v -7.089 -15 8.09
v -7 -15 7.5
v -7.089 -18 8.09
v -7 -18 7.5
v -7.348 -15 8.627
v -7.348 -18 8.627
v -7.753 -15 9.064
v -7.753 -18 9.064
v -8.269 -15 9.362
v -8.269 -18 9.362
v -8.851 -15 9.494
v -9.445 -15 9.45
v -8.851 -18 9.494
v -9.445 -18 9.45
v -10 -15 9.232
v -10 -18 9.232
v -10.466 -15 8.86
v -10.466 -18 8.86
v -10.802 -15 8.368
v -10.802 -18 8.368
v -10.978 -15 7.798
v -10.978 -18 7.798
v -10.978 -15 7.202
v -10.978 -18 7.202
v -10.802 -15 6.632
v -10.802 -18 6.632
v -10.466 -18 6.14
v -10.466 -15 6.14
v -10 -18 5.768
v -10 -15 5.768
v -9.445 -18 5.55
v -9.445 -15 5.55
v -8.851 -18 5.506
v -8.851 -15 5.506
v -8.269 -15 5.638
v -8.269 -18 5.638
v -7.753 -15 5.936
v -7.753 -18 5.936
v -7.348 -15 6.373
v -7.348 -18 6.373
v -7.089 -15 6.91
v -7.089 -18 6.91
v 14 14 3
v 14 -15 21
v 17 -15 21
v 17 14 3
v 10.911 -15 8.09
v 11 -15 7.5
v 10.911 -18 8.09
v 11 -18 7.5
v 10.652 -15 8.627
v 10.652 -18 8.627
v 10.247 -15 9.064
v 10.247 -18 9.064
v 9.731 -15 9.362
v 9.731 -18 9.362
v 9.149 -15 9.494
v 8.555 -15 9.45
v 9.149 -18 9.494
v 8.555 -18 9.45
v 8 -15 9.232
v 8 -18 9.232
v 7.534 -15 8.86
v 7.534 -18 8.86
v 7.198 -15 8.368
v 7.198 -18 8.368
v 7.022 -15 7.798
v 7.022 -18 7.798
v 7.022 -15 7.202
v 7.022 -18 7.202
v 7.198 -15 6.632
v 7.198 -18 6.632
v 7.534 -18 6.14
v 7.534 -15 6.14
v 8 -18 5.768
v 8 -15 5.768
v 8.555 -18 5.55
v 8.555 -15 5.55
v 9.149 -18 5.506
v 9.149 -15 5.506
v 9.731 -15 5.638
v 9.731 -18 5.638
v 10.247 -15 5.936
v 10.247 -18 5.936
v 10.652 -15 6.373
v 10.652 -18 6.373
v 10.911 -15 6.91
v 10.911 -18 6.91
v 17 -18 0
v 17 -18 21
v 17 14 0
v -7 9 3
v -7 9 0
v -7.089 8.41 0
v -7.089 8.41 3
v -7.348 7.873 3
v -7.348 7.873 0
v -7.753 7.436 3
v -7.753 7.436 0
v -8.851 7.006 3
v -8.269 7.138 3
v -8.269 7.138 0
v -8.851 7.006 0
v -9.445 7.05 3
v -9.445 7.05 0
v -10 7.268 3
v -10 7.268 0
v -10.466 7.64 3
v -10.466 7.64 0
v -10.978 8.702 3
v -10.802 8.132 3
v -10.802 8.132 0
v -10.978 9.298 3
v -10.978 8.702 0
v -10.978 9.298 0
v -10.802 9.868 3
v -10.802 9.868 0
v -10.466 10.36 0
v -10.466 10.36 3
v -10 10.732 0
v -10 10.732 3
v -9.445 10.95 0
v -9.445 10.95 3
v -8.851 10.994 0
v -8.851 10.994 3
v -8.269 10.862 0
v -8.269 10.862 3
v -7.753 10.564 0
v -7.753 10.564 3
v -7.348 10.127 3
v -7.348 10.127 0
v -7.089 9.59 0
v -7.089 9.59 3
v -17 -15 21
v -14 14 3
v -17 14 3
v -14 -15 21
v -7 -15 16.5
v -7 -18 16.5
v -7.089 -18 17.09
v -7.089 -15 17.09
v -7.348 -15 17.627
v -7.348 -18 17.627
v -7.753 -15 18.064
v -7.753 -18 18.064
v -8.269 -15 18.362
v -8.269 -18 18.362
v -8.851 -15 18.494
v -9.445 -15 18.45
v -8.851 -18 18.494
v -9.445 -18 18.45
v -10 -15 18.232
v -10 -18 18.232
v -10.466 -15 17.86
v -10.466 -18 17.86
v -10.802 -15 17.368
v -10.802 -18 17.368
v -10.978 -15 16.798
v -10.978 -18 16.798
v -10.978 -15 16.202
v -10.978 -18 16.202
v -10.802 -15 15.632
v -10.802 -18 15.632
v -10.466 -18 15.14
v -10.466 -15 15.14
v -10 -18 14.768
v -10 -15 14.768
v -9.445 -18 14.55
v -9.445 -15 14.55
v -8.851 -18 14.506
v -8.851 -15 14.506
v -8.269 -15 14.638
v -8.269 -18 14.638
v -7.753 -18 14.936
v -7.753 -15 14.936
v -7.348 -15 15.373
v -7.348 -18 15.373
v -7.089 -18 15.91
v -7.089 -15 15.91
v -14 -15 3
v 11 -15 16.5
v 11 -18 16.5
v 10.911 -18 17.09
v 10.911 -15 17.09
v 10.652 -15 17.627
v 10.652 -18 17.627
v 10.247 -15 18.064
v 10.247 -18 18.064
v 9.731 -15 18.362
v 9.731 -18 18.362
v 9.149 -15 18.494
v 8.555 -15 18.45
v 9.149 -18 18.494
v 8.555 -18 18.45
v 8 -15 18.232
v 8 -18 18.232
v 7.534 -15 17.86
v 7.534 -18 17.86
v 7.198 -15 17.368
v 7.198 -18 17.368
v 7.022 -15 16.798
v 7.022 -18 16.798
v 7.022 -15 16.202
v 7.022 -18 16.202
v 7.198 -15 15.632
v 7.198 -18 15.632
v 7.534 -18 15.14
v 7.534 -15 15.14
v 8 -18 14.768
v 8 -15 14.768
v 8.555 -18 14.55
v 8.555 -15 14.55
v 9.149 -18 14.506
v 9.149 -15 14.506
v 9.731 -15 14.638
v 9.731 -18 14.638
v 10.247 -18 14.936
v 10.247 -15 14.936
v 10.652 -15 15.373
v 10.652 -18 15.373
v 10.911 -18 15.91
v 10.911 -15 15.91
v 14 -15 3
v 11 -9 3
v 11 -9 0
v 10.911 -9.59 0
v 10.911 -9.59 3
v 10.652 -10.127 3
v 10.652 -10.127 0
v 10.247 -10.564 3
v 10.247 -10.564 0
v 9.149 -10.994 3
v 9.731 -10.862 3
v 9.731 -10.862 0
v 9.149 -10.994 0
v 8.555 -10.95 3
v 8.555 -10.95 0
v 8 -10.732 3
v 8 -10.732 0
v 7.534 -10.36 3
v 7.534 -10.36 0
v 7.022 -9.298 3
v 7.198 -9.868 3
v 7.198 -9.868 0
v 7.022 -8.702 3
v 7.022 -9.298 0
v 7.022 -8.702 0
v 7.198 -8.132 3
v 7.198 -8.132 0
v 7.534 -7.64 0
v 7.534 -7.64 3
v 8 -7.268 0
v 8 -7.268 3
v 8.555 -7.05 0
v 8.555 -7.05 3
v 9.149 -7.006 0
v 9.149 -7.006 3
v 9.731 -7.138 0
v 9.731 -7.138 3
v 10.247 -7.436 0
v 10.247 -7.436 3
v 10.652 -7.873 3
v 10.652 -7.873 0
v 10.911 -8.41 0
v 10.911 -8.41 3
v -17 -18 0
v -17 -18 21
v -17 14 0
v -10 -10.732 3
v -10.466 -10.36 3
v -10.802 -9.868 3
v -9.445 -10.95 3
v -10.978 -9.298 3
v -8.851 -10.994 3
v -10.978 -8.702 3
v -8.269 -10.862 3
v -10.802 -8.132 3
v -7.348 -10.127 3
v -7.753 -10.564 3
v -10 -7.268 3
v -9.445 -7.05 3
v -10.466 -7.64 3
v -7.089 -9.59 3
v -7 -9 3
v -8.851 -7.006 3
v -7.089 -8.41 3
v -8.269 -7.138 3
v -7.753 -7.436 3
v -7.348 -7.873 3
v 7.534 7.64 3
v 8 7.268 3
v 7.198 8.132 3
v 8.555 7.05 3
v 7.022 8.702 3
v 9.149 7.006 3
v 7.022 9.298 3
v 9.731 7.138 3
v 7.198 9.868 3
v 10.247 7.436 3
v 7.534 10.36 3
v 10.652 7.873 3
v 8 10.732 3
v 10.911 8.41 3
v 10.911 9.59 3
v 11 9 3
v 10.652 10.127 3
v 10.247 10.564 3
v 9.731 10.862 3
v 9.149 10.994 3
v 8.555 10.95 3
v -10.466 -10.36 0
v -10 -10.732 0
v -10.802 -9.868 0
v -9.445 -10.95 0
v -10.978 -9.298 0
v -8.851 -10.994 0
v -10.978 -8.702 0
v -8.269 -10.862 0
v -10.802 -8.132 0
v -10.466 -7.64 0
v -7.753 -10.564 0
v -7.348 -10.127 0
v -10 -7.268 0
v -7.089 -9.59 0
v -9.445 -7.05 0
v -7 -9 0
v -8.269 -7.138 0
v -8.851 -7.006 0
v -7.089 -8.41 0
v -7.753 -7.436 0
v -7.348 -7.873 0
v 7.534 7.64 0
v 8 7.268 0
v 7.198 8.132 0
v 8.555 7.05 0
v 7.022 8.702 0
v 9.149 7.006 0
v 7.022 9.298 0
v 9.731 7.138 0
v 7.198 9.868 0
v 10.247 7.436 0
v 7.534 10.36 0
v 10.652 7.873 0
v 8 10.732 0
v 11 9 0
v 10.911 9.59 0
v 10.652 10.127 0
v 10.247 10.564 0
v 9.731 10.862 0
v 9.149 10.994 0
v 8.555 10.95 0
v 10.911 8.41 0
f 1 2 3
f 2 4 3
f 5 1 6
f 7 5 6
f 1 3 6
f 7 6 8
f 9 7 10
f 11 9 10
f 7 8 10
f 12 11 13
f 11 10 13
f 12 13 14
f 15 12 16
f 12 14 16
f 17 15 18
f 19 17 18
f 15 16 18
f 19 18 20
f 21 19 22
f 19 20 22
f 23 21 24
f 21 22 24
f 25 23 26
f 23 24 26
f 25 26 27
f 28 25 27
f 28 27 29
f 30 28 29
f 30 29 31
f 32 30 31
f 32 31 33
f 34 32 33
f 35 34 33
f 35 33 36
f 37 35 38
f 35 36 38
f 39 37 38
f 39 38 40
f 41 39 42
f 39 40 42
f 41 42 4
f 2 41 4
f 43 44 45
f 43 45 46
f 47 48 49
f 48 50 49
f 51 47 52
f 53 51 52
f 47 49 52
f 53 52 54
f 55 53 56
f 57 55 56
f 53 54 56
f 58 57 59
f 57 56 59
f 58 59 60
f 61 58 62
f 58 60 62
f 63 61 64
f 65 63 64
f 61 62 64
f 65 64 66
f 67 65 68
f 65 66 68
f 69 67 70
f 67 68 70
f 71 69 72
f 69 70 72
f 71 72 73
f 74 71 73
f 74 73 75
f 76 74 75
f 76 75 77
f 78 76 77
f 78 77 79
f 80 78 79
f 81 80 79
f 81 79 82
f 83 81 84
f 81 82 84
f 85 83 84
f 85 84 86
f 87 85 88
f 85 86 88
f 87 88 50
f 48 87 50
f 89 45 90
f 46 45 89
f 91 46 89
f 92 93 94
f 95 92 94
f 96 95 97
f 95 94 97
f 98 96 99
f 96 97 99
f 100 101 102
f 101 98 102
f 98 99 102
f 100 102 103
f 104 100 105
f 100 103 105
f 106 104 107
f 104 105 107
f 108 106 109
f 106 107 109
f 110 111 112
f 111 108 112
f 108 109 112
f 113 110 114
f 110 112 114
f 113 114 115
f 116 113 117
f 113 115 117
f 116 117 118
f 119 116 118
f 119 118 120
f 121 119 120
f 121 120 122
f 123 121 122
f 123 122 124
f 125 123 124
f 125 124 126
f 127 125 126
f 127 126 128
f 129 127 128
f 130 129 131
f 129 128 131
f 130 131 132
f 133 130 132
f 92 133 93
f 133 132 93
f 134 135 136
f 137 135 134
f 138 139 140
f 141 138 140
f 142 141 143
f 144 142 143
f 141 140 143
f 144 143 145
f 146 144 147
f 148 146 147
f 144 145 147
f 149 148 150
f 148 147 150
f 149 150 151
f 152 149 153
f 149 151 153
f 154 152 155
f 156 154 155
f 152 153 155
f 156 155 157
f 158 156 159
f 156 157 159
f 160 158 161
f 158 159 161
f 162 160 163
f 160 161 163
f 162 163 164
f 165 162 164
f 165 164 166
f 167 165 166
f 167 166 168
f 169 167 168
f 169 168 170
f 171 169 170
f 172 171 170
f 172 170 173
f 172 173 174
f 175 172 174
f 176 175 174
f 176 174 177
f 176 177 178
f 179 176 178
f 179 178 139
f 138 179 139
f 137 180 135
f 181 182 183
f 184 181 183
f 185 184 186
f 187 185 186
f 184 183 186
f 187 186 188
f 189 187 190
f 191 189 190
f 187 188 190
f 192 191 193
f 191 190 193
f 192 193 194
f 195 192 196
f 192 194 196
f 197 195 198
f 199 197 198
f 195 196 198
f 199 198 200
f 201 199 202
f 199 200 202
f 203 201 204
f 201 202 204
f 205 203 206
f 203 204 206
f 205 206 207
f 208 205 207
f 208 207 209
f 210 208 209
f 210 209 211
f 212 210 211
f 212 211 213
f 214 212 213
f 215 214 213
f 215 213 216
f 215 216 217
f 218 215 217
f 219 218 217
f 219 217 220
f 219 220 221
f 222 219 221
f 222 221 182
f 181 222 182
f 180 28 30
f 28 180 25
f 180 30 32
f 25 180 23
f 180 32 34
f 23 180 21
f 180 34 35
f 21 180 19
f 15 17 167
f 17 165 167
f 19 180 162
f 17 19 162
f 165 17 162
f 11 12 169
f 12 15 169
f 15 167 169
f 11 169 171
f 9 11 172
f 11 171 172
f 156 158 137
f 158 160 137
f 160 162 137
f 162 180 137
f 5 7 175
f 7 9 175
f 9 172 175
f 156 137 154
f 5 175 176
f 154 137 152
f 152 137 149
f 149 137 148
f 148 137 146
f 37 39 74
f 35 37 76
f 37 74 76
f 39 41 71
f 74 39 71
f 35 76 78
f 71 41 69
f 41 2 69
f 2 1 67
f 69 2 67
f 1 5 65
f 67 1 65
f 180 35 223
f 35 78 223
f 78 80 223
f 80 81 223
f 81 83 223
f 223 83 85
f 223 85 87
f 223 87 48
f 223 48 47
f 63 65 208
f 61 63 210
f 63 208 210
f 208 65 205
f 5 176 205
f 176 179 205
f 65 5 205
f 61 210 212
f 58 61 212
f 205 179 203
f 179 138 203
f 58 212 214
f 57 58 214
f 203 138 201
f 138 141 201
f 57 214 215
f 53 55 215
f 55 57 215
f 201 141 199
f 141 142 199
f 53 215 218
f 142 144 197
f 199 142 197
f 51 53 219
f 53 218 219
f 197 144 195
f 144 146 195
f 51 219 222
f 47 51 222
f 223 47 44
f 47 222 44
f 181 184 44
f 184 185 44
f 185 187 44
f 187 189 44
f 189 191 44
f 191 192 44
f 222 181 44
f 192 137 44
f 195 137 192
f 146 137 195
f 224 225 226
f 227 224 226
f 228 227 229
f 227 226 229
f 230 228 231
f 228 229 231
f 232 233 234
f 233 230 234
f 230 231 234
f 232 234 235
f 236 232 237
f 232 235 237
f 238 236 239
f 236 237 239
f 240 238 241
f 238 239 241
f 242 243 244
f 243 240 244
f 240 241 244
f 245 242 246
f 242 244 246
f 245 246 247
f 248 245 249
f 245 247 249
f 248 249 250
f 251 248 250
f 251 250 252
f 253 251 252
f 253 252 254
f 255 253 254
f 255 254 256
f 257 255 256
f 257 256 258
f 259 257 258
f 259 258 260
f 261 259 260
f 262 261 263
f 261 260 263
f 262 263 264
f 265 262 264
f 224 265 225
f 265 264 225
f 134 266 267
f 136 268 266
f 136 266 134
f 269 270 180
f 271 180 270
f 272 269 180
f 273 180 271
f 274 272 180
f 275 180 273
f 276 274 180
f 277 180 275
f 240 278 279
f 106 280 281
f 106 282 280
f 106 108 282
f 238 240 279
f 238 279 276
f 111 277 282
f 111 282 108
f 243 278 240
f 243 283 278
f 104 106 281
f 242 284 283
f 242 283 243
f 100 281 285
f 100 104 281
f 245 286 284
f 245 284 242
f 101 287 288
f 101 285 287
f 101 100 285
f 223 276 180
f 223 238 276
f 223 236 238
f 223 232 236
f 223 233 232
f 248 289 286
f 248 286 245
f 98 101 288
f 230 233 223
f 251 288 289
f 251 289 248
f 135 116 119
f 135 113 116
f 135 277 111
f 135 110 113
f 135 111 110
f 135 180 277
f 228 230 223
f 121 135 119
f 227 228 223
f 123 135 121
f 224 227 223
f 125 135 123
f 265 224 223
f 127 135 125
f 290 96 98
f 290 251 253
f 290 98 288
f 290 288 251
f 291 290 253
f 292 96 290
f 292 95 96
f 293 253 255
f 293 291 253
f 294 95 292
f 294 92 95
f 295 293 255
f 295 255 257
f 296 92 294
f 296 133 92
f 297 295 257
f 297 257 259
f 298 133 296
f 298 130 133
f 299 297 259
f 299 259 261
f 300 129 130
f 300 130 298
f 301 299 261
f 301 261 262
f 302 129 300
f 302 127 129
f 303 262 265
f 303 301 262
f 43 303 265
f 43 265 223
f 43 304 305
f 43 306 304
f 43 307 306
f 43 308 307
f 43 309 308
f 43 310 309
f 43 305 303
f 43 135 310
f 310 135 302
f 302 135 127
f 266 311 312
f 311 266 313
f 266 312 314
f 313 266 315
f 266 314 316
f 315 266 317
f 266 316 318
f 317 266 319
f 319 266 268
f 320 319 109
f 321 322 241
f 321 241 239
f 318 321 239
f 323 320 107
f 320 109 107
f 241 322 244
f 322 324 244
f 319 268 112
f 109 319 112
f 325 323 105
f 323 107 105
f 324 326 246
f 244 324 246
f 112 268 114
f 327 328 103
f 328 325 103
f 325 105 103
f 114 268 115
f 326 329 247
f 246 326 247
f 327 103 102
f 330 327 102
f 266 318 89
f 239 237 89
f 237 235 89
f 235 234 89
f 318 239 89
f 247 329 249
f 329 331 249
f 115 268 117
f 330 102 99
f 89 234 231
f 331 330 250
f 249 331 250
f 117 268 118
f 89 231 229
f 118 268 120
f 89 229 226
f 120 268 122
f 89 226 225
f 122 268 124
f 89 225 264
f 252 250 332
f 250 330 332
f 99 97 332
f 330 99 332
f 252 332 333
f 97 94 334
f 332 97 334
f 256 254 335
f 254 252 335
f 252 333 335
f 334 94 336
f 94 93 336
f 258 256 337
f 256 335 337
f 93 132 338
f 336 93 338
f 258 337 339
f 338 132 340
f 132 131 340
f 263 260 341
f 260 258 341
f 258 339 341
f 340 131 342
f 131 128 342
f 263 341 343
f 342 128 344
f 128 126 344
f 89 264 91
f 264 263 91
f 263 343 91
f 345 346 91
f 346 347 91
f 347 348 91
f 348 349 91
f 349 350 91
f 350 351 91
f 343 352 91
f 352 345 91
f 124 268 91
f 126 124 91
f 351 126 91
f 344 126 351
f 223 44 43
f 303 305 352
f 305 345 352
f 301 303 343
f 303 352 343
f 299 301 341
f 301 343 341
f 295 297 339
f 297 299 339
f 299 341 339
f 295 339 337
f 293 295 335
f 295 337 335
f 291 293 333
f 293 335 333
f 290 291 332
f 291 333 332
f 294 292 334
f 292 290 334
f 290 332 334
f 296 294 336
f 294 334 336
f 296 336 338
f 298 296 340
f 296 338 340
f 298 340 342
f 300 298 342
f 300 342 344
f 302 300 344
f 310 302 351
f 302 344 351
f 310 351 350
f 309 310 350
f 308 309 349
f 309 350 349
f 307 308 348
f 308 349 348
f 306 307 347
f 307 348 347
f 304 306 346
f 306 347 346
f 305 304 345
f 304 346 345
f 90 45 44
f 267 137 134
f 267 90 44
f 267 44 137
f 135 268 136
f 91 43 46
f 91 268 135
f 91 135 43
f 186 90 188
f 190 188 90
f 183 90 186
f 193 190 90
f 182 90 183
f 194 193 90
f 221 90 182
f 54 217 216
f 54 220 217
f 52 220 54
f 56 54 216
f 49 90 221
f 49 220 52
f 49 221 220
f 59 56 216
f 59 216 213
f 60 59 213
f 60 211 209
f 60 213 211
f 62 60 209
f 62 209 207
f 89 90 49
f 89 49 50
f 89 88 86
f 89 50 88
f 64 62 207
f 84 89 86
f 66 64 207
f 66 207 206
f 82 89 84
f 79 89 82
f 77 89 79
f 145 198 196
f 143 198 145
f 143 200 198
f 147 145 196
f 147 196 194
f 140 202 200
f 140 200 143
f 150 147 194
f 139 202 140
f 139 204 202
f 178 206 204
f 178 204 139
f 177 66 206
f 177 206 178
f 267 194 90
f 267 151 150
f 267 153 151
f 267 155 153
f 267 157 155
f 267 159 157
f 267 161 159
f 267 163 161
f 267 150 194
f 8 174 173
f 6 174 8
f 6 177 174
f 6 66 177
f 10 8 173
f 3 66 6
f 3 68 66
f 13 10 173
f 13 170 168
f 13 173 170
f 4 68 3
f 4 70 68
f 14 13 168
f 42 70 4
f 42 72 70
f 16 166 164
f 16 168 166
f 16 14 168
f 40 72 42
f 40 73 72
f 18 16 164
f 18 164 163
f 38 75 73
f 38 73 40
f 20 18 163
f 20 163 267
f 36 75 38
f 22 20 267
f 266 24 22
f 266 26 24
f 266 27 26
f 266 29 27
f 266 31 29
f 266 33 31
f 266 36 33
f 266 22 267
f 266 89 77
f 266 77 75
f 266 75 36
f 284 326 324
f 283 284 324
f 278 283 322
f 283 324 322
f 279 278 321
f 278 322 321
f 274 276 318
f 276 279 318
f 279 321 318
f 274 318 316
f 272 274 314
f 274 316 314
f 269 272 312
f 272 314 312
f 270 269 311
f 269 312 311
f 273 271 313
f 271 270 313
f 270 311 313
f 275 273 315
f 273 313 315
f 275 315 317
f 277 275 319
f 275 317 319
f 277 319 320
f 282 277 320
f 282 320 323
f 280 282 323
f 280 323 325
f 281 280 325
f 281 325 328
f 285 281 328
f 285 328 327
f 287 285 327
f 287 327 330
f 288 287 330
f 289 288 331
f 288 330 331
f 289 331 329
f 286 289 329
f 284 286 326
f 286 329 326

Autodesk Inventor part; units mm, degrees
ref_plane "YZ Plane" through (0, 0, 0) normal (1, 0, 0) x (0, 1, 0)
ref_plane "XZ Plane" through (0, 0, 0) normal (0, 1, 0) x (-1, 0, 0)
ref_plane "XY Plane" through (0, 0, 0) normal (0, 0, 1) x (1, 0, 0)
sketch "Sketch1" plane through (0, 0, 0) normal (0, 0, 1) x (1, 0, 0)
  line L0 (-9, -9) -> (9, -9) construction
  line L1 (9, -9) -> (9, 9) construction
  line L2 (9, 9) -> (-9, 9) construction
  line L3 (-9, 9) -> (-9, -9) construction
  line L4 (-9, -9) -> (9, 9) construction
  line L5 (9, -9) -> (-9, 9) construction
  circle A0 centre (-9, 9) radius 2
  circle A1 centre (9, 9) radius 2
  circle A2 centre (9, -9) radius 2
  circle A3 centre (-9, -9) radius 2
  line L6 (-13.4025, 9) -> (21.0308, 9) construction
  line L7 (-13.4025, -18) -> (21.0308, -18)
  line L8 (14, -14) -> (-14, -14)
  line L9 (-14, -14) -> (-14, 14)
  line L10 (-14, 14) -> (14, 14)
  line L11 (14, 14) -> (14, -14)
  line L12 (-14, 14) -> (14, 14)
  line L13 (14, 14) -> (14, -18)
  line L14 (14, -18) -> (-14, -18)
  line L15 (-14, -18) -> (-14, 14)
  point P0 (0, 0)
  dimension "d0" = 18
  dimension "d1" = 18
  dimension "d2" = 4
  dimension "d3" = 4
  dimension "d4" = 27
  dimension "d5" = 5
  dimension "d6" = 9
  dimension "d7" = 14
extrude "Extrusion1" add sketch "Sketch1" along normal blind 3
sketch "Sketch2" plane through (-14, -18, 0) normal (0, -1, 0) x (1, 0, 0)
  line L0 (0, 3) -> (28, 3)
  line L1 (28, 3) -> (28, 21)
  line L2 (28, 21) -> (0, 21)
  line L3 (0, 21) -> (0, 3)
  line L4 (0, 21) -> (28, 3) construction
  line L5 (5, 7.5) -> (23, 7.5) construction
  line L6 (23, 7.5) -> (23, 16.5) construction
  line L7 (23, 16.5) -> (5, 16.5) construction
  line L8 (5, 16.5) -> (5, 7.5) construction
  line L9 (5, 7.5) -> (23, 16.5) construction
  line L10 (23, 7.5) -> (5, 16.5) construction
  circle A0 centre (5, 16.5) radius 2
  circle A1 centre (23, 16.5) radius 2
  line L11 (5, 12) -> (23, 12) construction
  line L12 (14, 16.5) -> (14, 7.5) construction
  circle A2 centre (5, 7.5) radius 2
  circle A3 centre (23, 7.5) radius 2
  line L13 (0, 0) -> (28, 0) projected
  line L14 (28, 0) -> (28, 3) projected
  line L15 (0, 3) -> (28, 3) projected
  line L16 (0, 0) -> (0, 3) projected
  line L17 (0, 0) -> (28, 0)
  line L18 (28, 0) -> (28, 3)
  line L19 (28, 3) -> (0, 3)
  line L20 (0, 3) -> (0, 0)
  point P0 (14, 0)
  point P1 (14, 12)
  dimension "d11" = 18
  dimension "d12" = 18
  dimension "d13" = 9
  dimension "d14" = 4
  dimension "d15" = 4
extrude "Extrusion2" add sketch "Sketch2" against normal blind 3
sketch "Sketch4" plane through (-14, 14, 0) normal (-1, 0, 0) x (0, 0, 1)
  line L0 (3, -29) -> (3, 0) projected
  line L1 (21, -32) -> (21, -29) projected
  line L2 (0, 0) -> (0, -32) projected
  line L3 (3, -29) -> (21, -29) projected
  line L4 (21, -32) -> (21, -29) projected
  line L5 (3, 0) -> (3, -29) projected
  line L6 (0, 0) -> (3, 0) projected
  line L7 (0, -32) -> (21, -32) projected
  line L8 (3, 0) -> (21, -29)
  point P0 (0, -14)
  point P1 (3, -32)
  point P2 (3, 0)
  point P3 (21, -32)
  point P4 (3, 0)
extrude "Extrusion3" add sketch "Sketch4" along normal blind 3
mirror "Mirror1" about plane through (0, 0, 0) normal (1, 0, 0) of "Extrusion3"
sketch "Sketch5" plane through (-14, -18, 0) normal (0, -1, 0) x (1, 0, 0)
  circle A0 centre (5, 7.5) radius 2 projected
  circle A1 centre (5, 7.5) radius 3
  point P0 (14, 0)
  dimension "d22" = 6
sketch "Sketch6" plane through (0, 0, 3) normal (0, 0, 1) x (1, 0, 0)
  circle A0 centre (-9, -9) radius 2 projected
  circle A1 centre (-9, -9) radius 3
  point P0 (0, 0)
  dimension "d23" = 6
properties part number "Escuadra" material "ABS Plastic"
